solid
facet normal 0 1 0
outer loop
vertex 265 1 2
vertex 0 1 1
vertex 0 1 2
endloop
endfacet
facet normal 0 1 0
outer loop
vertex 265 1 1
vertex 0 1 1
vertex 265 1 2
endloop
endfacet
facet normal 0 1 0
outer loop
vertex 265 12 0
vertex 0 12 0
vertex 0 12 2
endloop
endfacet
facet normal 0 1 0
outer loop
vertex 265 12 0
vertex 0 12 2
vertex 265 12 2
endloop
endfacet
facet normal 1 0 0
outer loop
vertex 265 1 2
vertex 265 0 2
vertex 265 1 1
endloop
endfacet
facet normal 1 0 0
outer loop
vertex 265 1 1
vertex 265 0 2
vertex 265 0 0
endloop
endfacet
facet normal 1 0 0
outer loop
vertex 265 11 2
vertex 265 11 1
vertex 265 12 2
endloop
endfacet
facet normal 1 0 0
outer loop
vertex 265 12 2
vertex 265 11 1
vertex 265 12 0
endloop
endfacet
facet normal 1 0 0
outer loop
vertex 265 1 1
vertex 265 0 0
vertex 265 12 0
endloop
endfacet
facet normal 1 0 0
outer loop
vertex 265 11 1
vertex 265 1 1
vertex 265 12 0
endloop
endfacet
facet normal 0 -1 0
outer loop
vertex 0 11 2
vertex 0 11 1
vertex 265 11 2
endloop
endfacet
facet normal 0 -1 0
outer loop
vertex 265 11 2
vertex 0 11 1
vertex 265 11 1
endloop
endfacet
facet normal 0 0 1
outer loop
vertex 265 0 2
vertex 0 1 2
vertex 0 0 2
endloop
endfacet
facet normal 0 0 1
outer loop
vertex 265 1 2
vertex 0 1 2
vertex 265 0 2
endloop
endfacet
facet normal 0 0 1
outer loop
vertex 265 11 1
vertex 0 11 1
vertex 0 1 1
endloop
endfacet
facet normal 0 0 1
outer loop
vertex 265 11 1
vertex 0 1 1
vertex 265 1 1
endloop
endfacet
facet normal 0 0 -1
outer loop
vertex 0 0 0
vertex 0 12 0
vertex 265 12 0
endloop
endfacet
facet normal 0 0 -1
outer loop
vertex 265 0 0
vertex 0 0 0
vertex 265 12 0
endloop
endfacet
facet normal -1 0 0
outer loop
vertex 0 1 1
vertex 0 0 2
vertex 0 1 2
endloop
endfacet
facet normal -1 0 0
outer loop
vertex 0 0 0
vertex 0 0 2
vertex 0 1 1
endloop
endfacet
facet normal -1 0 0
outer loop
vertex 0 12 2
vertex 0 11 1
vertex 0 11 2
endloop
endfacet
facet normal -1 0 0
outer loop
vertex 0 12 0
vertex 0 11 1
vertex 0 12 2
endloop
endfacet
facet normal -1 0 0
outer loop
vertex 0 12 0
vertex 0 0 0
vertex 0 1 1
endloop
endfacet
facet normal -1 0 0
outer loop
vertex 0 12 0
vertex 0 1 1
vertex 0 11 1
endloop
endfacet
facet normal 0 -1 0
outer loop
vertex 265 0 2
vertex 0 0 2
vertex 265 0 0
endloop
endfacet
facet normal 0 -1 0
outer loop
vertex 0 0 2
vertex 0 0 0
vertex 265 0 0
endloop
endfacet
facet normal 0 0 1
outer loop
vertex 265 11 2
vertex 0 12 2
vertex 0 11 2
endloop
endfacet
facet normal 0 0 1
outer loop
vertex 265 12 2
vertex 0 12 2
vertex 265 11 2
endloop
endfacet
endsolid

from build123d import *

# Parameters (mm, degrees)
RECTANGLE008_W   = 265
RECTANGLE008_H   = 1
EXTRUDE011_DEPTH = 1
RECTANGLE007_W   = 265
RECTANGLE007_H   = 1
EXTRUDE012_DEPTH = 1
RECTANGLE009_W   = 265
RECTANGLE009_H   = 12
EXTRUDE010_DEPTH = 1


with BuildPart() as h_bottom_lip:
    # Rectangle008 → Extrude011 (new body)
    with BuildSketch(Plane.XY.offset(1)):
        with Locations((132.5, 0.5)):
            Rectangle(RECTANGLE008_W, RECTANGLE008_H)
    extrude(amount=EXTRUDE011_DEPTH)


with BuildPart() as h_top_lip:
    # Rectangle007 → Extrude012 (new body)
    with BuildSketch(Plane(origin=(0, 11, 1), x_dir=(1, 0, 0), z_dir=(0, 0, 1))):
        with Locations((132.5, 0.5)):
            Rectangle(RECTANGLE007_W, RECTANGLE007_H)
    extrude(amount=EXTRUDE012_DEPTH)


with BuildPart() as h_holder:
    # Rectangle009 → Extrude010 (new body)
    with BuildSketch(Plane.XY):
        with Locations((132.5, 6)):
            Rectangle(RECTANGLE009_W, RECTANGLE009_H)
    extrude(amount=EXTRUDE010_DEPTH)

    # Fusion005: union h_bottom_lip, h_top_lip
    add(h_bottom_lip.part)
    add(h_top_lip.part)


solid = h_holder.part
